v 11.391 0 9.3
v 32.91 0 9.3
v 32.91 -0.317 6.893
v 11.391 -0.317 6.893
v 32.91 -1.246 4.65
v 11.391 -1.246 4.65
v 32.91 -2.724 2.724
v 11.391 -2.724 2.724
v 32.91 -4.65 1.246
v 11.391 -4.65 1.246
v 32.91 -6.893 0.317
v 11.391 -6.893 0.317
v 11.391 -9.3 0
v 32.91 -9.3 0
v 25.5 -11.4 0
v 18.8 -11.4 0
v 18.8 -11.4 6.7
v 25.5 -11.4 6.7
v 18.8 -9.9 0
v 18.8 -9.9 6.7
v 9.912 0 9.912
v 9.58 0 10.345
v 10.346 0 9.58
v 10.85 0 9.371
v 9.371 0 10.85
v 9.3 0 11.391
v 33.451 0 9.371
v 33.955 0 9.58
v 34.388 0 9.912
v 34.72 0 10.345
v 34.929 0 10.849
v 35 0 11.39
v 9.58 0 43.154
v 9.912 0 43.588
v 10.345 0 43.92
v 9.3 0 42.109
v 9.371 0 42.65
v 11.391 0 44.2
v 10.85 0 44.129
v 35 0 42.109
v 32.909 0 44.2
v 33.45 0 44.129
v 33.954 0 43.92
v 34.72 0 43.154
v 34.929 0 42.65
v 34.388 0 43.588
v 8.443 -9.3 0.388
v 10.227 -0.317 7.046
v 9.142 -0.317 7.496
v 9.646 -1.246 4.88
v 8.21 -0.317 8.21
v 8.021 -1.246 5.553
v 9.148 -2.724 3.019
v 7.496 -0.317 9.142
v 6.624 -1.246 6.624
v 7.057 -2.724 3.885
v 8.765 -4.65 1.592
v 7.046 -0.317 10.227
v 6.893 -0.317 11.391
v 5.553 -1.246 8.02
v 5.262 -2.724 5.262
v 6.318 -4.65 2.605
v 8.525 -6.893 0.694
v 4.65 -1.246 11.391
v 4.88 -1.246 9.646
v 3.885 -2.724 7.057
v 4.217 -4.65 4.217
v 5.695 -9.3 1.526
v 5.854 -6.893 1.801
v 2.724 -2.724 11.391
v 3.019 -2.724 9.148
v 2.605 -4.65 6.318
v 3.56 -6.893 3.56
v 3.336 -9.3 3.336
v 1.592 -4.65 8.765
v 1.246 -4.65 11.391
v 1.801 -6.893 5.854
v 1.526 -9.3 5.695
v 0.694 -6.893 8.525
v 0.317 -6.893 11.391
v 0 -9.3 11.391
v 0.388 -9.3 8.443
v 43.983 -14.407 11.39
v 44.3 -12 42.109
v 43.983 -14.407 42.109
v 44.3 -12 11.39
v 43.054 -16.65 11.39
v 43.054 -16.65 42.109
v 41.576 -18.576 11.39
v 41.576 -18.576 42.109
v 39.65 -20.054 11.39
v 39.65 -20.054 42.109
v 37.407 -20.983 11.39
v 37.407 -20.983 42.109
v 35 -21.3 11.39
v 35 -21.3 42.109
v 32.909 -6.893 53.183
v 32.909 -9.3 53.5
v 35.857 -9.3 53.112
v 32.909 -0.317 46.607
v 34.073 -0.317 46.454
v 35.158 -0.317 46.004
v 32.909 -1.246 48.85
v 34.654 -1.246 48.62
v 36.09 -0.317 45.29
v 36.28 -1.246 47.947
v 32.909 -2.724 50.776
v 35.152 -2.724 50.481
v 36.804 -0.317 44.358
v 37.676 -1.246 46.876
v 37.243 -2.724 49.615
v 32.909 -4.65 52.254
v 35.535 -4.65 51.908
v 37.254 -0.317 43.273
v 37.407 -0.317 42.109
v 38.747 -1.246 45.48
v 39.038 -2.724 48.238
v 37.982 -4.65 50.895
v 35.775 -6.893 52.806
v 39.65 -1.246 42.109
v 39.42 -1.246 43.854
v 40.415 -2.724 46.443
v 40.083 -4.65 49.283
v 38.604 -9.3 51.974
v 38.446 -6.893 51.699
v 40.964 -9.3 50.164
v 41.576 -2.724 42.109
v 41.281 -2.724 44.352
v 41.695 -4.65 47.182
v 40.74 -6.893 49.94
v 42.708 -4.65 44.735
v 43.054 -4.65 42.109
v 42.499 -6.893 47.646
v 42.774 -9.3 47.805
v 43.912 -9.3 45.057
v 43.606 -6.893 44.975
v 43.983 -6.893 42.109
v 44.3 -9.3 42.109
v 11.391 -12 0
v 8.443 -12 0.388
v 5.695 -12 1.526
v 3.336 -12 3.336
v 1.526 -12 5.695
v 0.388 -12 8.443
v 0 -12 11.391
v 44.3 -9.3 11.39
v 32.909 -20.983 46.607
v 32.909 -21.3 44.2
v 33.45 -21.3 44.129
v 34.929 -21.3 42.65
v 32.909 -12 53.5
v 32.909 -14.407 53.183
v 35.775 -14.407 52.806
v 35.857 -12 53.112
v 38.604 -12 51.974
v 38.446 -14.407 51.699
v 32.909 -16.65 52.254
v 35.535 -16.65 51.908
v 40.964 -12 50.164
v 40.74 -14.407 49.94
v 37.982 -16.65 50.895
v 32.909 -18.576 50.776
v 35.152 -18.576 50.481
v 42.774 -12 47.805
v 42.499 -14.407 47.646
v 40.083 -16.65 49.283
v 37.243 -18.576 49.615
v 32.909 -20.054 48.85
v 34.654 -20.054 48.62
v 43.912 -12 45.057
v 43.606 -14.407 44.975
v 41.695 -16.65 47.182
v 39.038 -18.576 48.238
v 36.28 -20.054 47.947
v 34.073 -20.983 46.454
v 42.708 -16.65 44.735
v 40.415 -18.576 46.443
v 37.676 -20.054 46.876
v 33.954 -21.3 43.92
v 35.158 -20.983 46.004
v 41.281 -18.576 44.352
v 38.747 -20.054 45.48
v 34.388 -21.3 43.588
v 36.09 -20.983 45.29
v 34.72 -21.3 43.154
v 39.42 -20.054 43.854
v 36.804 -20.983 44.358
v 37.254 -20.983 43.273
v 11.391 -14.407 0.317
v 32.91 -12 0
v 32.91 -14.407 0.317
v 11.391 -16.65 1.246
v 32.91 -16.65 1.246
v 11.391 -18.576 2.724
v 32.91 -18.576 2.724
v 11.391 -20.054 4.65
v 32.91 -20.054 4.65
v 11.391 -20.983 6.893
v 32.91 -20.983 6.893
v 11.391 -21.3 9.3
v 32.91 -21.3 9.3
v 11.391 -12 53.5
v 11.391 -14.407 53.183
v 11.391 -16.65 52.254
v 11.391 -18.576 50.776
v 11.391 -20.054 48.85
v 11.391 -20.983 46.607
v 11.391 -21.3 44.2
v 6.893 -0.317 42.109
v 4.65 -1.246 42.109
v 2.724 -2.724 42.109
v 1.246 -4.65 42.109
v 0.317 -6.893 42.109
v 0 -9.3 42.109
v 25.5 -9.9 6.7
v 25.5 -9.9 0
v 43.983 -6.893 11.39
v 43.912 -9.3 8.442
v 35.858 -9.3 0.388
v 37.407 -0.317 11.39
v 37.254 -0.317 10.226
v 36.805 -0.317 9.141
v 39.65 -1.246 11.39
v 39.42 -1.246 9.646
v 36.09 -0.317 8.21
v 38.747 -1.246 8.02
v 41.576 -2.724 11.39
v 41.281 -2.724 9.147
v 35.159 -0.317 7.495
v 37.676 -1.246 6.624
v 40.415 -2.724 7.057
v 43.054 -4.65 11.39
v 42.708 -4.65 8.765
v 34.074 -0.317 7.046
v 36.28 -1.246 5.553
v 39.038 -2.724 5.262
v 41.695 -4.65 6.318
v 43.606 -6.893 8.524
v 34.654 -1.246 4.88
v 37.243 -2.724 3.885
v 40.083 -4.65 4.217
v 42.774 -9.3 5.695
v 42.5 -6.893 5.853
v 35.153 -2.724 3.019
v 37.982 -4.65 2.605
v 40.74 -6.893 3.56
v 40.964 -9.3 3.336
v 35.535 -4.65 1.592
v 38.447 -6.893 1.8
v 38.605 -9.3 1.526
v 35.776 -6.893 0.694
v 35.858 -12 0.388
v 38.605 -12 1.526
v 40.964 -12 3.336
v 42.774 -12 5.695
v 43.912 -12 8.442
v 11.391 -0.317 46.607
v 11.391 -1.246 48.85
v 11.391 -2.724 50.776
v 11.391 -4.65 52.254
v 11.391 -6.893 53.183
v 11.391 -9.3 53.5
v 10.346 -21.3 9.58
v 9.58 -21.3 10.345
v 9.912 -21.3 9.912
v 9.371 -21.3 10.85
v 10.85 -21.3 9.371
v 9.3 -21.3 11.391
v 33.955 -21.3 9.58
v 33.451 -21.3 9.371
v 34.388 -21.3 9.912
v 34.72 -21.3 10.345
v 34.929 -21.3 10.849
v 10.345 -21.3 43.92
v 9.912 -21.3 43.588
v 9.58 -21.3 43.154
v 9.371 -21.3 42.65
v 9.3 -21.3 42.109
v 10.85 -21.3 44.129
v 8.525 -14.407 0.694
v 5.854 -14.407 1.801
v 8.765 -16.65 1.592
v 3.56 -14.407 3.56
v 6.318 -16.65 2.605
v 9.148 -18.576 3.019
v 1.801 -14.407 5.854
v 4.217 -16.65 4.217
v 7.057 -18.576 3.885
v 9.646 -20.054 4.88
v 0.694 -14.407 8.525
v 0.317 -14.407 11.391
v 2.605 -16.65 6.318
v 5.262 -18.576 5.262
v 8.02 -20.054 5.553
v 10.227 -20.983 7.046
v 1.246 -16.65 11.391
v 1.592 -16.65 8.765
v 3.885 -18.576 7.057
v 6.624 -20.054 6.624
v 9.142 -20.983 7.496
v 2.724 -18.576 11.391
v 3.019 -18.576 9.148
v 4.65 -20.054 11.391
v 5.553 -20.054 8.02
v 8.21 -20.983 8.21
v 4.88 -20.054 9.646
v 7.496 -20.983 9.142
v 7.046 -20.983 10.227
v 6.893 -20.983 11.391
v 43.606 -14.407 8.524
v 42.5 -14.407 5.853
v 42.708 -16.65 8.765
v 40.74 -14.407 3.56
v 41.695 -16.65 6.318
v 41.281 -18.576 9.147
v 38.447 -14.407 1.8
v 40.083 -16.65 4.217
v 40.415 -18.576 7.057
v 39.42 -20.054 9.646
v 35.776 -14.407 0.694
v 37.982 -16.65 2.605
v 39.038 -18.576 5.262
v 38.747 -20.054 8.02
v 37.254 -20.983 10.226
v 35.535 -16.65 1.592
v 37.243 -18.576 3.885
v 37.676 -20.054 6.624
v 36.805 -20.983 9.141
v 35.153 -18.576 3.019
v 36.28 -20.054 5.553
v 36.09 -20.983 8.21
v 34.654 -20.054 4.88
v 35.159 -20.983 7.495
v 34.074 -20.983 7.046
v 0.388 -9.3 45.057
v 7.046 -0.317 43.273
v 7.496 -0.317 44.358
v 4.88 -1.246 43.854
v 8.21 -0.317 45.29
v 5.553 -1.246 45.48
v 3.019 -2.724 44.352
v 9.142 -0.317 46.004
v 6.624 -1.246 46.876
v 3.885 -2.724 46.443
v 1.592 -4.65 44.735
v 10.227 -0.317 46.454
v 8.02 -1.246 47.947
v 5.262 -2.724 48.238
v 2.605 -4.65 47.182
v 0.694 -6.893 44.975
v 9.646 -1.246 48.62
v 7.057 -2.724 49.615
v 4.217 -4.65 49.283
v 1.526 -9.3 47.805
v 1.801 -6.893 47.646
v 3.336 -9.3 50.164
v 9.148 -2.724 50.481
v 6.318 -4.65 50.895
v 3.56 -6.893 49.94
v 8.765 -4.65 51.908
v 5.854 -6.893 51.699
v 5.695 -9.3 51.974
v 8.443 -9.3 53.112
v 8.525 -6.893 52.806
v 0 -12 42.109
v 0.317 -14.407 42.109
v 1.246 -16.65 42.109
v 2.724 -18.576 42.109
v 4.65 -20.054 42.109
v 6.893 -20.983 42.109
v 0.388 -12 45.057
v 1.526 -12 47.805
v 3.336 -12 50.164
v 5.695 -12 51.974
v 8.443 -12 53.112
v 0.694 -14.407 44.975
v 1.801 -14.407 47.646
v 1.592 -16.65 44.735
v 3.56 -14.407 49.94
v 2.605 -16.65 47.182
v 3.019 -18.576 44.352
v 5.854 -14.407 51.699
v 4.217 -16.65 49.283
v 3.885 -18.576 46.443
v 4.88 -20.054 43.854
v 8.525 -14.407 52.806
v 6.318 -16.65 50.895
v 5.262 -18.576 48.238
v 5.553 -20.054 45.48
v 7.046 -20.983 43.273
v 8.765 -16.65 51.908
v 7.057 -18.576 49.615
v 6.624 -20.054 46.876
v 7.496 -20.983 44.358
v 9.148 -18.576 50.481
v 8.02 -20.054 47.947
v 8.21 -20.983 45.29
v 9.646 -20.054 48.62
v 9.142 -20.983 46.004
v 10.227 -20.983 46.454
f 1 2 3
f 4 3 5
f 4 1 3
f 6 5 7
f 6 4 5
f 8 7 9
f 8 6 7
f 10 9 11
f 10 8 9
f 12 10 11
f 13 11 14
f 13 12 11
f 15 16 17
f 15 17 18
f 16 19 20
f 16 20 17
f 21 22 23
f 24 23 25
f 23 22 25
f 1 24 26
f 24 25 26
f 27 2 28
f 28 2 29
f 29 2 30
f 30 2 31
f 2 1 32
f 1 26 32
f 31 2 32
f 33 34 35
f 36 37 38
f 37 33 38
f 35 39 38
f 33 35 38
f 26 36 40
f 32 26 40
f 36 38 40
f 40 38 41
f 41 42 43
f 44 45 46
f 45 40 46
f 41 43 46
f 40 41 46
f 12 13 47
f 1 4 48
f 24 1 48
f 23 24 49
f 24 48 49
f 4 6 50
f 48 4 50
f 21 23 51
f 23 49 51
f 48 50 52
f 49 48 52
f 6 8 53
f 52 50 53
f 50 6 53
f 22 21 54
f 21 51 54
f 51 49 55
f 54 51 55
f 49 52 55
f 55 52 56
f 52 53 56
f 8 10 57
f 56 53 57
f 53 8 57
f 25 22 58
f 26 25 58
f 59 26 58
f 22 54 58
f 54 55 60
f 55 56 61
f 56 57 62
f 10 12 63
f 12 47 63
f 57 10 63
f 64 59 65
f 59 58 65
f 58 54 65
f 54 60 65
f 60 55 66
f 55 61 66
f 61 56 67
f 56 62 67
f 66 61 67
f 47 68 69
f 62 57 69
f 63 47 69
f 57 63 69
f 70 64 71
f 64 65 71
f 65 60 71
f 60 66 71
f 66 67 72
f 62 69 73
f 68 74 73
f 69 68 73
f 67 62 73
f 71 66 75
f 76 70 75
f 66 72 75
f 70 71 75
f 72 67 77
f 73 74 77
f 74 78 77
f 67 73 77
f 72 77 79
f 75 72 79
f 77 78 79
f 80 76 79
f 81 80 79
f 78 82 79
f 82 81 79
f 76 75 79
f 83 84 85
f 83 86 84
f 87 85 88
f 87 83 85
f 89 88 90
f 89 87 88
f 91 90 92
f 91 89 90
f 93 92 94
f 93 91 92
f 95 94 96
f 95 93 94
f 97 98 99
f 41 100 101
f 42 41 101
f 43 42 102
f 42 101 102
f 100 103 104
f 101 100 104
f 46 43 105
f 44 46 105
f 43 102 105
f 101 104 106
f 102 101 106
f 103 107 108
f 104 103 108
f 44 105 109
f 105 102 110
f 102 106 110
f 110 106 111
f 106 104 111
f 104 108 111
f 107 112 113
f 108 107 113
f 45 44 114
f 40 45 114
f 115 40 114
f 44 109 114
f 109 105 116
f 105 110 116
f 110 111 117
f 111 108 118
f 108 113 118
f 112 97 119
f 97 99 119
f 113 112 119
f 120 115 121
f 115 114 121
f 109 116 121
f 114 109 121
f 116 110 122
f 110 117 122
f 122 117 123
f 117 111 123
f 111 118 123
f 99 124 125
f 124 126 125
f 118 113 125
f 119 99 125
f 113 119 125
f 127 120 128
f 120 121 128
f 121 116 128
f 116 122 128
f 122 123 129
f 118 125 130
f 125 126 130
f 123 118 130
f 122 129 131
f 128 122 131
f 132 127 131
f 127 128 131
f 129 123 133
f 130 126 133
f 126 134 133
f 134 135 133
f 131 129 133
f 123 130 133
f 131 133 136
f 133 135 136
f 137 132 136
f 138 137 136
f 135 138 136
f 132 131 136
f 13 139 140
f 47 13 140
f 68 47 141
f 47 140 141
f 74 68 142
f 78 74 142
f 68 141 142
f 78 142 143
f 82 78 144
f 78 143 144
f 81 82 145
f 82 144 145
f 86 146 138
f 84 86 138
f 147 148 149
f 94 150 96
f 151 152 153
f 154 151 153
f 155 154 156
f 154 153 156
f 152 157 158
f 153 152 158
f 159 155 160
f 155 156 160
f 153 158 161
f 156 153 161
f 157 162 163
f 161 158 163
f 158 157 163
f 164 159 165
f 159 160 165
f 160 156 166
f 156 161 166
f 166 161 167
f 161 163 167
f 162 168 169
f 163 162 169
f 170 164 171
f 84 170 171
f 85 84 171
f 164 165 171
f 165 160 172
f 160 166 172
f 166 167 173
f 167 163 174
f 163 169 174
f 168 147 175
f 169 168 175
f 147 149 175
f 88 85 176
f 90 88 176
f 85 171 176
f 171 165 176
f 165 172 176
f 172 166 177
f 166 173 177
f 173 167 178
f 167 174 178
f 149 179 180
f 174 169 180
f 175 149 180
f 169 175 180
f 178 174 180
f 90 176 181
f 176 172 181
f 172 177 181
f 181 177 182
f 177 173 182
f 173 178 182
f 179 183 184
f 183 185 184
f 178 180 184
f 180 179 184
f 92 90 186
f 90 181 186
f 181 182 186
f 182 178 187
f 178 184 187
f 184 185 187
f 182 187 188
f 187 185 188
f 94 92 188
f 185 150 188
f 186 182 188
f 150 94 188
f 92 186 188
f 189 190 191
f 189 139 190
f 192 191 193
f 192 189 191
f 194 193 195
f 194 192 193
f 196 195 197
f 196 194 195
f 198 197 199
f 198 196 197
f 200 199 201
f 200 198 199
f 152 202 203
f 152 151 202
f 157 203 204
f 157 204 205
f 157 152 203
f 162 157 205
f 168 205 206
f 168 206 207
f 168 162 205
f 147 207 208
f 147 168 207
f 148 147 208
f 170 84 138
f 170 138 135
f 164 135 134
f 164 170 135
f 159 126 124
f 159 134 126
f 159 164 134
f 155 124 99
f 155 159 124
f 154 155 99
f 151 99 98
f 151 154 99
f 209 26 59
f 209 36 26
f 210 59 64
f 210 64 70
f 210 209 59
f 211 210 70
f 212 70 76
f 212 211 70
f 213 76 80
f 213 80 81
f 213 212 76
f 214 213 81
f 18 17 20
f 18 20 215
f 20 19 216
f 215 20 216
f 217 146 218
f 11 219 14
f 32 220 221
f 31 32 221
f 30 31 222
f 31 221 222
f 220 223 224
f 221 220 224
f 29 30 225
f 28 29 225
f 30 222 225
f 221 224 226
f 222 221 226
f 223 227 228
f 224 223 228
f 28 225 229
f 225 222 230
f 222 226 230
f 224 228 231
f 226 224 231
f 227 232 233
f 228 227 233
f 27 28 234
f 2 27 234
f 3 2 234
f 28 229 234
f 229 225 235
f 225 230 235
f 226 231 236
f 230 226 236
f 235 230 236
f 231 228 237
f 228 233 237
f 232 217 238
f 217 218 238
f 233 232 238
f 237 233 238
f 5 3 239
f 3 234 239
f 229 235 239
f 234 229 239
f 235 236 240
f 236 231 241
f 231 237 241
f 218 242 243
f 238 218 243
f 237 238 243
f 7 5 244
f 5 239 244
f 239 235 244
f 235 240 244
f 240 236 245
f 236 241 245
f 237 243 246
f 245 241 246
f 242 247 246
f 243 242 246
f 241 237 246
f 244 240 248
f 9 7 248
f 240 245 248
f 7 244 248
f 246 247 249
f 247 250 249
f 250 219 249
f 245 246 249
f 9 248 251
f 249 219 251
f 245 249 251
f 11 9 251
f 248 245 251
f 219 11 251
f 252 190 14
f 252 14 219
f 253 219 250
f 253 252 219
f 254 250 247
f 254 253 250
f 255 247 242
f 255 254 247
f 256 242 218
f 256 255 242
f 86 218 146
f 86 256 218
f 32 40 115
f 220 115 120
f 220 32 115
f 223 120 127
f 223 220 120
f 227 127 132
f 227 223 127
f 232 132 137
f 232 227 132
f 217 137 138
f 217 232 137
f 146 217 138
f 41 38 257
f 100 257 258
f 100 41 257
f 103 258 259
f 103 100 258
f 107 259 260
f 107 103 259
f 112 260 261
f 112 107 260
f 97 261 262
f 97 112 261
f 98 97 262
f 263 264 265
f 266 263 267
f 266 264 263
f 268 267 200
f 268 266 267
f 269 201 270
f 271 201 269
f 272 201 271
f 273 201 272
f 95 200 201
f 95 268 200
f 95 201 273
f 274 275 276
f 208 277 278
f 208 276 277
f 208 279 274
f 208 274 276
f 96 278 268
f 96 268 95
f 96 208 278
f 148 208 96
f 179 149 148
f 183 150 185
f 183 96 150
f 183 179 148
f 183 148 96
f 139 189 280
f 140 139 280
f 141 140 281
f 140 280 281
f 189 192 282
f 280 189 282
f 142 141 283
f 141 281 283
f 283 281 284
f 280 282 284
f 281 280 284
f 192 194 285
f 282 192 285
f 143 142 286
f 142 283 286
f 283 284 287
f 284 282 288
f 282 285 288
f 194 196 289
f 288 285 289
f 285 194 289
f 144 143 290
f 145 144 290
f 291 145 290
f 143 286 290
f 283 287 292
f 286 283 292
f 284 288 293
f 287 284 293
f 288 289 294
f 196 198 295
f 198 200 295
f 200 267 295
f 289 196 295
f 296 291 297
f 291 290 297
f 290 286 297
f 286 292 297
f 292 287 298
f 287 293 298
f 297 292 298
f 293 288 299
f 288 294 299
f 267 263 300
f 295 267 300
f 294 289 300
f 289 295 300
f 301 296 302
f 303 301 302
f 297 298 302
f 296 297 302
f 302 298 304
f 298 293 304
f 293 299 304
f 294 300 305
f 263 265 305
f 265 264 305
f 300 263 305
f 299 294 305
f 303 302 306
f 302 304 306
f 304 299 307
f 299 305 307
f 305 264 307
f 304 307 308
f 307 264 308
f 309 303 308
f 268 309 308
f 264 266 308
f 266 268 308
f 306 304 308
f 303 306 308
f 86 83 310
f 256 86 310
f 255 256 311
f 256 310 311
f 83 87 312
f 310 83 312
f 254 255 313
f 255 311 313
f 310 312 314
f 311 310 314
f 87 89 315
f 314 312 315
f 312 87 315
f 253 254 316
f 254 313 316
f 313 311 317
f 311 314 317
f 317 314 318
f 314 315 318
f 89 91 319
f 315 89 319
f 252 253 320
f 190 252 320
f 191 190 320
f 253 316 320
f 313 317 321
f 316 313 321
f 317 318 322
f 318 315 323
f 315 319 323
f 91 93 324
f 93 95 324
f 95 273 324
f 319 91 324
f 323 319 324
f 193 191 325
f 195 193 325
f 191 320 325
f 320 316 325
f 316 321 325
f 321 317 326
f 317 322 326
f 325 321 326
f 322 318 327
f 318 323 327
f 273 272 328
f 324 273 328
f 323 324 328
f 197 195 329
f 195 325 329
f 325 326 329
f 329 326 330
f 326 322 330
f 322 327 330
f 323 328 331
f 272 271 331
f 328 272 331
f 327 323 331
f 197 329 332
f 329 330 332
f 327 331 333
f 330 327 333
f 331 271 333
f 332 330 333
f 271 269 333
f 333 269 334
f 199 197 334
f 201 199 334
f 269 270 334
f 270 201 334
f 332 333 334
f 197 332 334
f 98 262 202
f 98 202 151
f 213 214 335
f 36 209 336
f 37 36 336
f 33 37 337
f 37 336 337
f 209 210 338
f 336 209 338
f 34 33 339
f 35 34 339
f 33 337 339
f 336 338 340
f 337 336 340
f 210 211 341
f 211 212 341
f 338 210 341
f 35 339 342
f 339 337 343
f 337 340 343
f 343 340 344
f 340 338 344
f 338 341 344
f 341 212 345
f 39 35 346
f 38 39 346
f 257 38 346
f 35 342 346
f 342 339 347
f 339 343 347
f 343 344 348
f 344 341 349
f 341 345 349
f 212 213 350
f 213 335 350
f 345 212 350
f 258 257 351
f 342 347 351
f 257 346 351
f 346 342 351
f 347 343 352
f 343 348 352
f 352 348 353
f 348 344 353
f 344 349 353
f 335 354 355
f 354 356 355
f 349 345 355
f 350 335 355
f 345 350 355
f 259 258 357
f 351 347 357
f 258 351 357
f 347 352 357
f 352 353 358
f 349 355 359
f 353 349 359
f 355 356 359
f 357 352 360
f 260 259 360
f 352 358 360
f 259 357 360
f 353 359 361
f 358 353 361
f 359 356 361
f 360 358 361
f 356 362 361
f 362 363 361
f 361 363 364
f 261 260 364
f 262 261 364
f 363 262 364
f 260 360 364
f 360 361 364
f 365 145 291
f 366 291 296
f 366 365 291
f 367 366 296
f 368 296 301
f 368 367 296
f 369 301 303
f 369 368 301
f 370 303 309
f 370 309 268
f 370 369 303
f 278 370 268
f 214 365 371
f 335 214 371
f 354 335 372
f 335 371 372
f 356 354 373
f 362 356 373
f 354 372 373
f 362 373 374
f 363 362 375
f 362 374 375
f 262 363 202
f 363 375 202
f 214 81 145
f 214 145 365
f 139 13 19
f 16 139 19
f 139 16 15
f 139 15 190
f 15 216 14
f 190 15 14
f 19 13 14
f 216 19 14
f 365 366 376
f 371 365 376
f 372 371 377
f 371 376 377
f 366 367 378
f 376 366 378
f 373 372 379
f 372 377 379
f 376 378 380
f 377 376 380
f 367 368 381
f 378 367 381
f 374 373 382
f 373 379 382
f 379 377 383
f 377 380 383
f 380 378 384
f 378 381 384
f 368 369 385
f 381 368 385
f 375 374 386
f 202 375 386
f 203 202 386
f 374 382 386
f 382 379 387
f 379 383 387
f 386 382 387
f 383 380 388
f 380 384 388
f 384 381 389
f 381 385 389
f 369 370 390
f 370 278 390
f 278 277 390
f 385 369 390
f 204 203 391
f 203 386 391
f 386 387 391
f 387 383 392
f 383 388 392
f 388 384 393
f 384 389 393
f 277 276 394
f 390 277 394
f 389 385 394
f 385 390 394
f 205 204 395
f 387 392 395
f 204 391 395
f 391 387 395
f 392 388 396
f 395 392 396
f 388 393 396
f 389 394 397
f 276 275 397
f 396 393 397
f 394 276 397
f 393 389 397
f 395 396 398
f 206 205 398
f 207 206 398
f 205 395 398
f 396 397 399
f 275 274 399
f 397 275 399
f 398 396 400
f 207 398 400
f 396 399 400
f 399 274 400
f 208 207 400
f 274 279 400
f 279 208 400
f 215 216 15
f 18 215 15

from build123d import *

# Parameters (mm, degrees)
F0_W     = 44.3
F0_H     = 53.5
F1_DEPTH = 21.3
F2_R     = 11.39
F3_R     = 11.391
F4_R     = 11.391
F5_R     = 9.3
F6_W     = 6.7
F6_H     = 1.5
F7_DEPTH = 6.7


with BuildPart() as f1:
    # F0 (on Front) → F1 (new body)
    with BuildSketch(Plane.XZ):
        with Locations((22.15, 26.75)):
            Rectangle(F0_W, F0_H)
    extrude(amount=F1_DEPTH)

    # F2
    f2_edges = [f1.edges().sort_by_distance(p)[0] for p in [
        (44.3, -10.65, 0),
    ]]
    fillet(f2_edges, radius=F2_R)

    # F3
    f3_edges = [f1.edges().sort_by_distance(p)[0] for p in [
        (0, -10.65, 0),
    ]]
    fillet(f3_edges, radius=F3_R)

    # F4
    f4_edges = [f1.edges().sort_by_distance(p)[0] for p in [
        (44.3, -10.65, 53.5),
        (0, -10.65, 53.5),
    ]]
    fillet(f4_edges, radius=F4_R)

    # F5
    f5_edges = [f1.edges().sort_by_distance(p)[0] for p in [
        (3.336347, -21.3, 50.163653),
        (3.336347, 0, 50.163653),
    ]]
    fillet(f5_edges, radius=F5_R)

    # F6 (on face) → F7 (cut)
    with BuildSketch(Plane(origin=(0, 0, 0), x_dir=(1, 0, 0), z_dir=(0, 0, -1))):
        with Locations((22.15018, 10.65)):
            Rectangle(F6_W, F6_H)
    extrude(amount=-F7_DEPTH, mode=Mode.SUBTRACT)


solid = f1.part
